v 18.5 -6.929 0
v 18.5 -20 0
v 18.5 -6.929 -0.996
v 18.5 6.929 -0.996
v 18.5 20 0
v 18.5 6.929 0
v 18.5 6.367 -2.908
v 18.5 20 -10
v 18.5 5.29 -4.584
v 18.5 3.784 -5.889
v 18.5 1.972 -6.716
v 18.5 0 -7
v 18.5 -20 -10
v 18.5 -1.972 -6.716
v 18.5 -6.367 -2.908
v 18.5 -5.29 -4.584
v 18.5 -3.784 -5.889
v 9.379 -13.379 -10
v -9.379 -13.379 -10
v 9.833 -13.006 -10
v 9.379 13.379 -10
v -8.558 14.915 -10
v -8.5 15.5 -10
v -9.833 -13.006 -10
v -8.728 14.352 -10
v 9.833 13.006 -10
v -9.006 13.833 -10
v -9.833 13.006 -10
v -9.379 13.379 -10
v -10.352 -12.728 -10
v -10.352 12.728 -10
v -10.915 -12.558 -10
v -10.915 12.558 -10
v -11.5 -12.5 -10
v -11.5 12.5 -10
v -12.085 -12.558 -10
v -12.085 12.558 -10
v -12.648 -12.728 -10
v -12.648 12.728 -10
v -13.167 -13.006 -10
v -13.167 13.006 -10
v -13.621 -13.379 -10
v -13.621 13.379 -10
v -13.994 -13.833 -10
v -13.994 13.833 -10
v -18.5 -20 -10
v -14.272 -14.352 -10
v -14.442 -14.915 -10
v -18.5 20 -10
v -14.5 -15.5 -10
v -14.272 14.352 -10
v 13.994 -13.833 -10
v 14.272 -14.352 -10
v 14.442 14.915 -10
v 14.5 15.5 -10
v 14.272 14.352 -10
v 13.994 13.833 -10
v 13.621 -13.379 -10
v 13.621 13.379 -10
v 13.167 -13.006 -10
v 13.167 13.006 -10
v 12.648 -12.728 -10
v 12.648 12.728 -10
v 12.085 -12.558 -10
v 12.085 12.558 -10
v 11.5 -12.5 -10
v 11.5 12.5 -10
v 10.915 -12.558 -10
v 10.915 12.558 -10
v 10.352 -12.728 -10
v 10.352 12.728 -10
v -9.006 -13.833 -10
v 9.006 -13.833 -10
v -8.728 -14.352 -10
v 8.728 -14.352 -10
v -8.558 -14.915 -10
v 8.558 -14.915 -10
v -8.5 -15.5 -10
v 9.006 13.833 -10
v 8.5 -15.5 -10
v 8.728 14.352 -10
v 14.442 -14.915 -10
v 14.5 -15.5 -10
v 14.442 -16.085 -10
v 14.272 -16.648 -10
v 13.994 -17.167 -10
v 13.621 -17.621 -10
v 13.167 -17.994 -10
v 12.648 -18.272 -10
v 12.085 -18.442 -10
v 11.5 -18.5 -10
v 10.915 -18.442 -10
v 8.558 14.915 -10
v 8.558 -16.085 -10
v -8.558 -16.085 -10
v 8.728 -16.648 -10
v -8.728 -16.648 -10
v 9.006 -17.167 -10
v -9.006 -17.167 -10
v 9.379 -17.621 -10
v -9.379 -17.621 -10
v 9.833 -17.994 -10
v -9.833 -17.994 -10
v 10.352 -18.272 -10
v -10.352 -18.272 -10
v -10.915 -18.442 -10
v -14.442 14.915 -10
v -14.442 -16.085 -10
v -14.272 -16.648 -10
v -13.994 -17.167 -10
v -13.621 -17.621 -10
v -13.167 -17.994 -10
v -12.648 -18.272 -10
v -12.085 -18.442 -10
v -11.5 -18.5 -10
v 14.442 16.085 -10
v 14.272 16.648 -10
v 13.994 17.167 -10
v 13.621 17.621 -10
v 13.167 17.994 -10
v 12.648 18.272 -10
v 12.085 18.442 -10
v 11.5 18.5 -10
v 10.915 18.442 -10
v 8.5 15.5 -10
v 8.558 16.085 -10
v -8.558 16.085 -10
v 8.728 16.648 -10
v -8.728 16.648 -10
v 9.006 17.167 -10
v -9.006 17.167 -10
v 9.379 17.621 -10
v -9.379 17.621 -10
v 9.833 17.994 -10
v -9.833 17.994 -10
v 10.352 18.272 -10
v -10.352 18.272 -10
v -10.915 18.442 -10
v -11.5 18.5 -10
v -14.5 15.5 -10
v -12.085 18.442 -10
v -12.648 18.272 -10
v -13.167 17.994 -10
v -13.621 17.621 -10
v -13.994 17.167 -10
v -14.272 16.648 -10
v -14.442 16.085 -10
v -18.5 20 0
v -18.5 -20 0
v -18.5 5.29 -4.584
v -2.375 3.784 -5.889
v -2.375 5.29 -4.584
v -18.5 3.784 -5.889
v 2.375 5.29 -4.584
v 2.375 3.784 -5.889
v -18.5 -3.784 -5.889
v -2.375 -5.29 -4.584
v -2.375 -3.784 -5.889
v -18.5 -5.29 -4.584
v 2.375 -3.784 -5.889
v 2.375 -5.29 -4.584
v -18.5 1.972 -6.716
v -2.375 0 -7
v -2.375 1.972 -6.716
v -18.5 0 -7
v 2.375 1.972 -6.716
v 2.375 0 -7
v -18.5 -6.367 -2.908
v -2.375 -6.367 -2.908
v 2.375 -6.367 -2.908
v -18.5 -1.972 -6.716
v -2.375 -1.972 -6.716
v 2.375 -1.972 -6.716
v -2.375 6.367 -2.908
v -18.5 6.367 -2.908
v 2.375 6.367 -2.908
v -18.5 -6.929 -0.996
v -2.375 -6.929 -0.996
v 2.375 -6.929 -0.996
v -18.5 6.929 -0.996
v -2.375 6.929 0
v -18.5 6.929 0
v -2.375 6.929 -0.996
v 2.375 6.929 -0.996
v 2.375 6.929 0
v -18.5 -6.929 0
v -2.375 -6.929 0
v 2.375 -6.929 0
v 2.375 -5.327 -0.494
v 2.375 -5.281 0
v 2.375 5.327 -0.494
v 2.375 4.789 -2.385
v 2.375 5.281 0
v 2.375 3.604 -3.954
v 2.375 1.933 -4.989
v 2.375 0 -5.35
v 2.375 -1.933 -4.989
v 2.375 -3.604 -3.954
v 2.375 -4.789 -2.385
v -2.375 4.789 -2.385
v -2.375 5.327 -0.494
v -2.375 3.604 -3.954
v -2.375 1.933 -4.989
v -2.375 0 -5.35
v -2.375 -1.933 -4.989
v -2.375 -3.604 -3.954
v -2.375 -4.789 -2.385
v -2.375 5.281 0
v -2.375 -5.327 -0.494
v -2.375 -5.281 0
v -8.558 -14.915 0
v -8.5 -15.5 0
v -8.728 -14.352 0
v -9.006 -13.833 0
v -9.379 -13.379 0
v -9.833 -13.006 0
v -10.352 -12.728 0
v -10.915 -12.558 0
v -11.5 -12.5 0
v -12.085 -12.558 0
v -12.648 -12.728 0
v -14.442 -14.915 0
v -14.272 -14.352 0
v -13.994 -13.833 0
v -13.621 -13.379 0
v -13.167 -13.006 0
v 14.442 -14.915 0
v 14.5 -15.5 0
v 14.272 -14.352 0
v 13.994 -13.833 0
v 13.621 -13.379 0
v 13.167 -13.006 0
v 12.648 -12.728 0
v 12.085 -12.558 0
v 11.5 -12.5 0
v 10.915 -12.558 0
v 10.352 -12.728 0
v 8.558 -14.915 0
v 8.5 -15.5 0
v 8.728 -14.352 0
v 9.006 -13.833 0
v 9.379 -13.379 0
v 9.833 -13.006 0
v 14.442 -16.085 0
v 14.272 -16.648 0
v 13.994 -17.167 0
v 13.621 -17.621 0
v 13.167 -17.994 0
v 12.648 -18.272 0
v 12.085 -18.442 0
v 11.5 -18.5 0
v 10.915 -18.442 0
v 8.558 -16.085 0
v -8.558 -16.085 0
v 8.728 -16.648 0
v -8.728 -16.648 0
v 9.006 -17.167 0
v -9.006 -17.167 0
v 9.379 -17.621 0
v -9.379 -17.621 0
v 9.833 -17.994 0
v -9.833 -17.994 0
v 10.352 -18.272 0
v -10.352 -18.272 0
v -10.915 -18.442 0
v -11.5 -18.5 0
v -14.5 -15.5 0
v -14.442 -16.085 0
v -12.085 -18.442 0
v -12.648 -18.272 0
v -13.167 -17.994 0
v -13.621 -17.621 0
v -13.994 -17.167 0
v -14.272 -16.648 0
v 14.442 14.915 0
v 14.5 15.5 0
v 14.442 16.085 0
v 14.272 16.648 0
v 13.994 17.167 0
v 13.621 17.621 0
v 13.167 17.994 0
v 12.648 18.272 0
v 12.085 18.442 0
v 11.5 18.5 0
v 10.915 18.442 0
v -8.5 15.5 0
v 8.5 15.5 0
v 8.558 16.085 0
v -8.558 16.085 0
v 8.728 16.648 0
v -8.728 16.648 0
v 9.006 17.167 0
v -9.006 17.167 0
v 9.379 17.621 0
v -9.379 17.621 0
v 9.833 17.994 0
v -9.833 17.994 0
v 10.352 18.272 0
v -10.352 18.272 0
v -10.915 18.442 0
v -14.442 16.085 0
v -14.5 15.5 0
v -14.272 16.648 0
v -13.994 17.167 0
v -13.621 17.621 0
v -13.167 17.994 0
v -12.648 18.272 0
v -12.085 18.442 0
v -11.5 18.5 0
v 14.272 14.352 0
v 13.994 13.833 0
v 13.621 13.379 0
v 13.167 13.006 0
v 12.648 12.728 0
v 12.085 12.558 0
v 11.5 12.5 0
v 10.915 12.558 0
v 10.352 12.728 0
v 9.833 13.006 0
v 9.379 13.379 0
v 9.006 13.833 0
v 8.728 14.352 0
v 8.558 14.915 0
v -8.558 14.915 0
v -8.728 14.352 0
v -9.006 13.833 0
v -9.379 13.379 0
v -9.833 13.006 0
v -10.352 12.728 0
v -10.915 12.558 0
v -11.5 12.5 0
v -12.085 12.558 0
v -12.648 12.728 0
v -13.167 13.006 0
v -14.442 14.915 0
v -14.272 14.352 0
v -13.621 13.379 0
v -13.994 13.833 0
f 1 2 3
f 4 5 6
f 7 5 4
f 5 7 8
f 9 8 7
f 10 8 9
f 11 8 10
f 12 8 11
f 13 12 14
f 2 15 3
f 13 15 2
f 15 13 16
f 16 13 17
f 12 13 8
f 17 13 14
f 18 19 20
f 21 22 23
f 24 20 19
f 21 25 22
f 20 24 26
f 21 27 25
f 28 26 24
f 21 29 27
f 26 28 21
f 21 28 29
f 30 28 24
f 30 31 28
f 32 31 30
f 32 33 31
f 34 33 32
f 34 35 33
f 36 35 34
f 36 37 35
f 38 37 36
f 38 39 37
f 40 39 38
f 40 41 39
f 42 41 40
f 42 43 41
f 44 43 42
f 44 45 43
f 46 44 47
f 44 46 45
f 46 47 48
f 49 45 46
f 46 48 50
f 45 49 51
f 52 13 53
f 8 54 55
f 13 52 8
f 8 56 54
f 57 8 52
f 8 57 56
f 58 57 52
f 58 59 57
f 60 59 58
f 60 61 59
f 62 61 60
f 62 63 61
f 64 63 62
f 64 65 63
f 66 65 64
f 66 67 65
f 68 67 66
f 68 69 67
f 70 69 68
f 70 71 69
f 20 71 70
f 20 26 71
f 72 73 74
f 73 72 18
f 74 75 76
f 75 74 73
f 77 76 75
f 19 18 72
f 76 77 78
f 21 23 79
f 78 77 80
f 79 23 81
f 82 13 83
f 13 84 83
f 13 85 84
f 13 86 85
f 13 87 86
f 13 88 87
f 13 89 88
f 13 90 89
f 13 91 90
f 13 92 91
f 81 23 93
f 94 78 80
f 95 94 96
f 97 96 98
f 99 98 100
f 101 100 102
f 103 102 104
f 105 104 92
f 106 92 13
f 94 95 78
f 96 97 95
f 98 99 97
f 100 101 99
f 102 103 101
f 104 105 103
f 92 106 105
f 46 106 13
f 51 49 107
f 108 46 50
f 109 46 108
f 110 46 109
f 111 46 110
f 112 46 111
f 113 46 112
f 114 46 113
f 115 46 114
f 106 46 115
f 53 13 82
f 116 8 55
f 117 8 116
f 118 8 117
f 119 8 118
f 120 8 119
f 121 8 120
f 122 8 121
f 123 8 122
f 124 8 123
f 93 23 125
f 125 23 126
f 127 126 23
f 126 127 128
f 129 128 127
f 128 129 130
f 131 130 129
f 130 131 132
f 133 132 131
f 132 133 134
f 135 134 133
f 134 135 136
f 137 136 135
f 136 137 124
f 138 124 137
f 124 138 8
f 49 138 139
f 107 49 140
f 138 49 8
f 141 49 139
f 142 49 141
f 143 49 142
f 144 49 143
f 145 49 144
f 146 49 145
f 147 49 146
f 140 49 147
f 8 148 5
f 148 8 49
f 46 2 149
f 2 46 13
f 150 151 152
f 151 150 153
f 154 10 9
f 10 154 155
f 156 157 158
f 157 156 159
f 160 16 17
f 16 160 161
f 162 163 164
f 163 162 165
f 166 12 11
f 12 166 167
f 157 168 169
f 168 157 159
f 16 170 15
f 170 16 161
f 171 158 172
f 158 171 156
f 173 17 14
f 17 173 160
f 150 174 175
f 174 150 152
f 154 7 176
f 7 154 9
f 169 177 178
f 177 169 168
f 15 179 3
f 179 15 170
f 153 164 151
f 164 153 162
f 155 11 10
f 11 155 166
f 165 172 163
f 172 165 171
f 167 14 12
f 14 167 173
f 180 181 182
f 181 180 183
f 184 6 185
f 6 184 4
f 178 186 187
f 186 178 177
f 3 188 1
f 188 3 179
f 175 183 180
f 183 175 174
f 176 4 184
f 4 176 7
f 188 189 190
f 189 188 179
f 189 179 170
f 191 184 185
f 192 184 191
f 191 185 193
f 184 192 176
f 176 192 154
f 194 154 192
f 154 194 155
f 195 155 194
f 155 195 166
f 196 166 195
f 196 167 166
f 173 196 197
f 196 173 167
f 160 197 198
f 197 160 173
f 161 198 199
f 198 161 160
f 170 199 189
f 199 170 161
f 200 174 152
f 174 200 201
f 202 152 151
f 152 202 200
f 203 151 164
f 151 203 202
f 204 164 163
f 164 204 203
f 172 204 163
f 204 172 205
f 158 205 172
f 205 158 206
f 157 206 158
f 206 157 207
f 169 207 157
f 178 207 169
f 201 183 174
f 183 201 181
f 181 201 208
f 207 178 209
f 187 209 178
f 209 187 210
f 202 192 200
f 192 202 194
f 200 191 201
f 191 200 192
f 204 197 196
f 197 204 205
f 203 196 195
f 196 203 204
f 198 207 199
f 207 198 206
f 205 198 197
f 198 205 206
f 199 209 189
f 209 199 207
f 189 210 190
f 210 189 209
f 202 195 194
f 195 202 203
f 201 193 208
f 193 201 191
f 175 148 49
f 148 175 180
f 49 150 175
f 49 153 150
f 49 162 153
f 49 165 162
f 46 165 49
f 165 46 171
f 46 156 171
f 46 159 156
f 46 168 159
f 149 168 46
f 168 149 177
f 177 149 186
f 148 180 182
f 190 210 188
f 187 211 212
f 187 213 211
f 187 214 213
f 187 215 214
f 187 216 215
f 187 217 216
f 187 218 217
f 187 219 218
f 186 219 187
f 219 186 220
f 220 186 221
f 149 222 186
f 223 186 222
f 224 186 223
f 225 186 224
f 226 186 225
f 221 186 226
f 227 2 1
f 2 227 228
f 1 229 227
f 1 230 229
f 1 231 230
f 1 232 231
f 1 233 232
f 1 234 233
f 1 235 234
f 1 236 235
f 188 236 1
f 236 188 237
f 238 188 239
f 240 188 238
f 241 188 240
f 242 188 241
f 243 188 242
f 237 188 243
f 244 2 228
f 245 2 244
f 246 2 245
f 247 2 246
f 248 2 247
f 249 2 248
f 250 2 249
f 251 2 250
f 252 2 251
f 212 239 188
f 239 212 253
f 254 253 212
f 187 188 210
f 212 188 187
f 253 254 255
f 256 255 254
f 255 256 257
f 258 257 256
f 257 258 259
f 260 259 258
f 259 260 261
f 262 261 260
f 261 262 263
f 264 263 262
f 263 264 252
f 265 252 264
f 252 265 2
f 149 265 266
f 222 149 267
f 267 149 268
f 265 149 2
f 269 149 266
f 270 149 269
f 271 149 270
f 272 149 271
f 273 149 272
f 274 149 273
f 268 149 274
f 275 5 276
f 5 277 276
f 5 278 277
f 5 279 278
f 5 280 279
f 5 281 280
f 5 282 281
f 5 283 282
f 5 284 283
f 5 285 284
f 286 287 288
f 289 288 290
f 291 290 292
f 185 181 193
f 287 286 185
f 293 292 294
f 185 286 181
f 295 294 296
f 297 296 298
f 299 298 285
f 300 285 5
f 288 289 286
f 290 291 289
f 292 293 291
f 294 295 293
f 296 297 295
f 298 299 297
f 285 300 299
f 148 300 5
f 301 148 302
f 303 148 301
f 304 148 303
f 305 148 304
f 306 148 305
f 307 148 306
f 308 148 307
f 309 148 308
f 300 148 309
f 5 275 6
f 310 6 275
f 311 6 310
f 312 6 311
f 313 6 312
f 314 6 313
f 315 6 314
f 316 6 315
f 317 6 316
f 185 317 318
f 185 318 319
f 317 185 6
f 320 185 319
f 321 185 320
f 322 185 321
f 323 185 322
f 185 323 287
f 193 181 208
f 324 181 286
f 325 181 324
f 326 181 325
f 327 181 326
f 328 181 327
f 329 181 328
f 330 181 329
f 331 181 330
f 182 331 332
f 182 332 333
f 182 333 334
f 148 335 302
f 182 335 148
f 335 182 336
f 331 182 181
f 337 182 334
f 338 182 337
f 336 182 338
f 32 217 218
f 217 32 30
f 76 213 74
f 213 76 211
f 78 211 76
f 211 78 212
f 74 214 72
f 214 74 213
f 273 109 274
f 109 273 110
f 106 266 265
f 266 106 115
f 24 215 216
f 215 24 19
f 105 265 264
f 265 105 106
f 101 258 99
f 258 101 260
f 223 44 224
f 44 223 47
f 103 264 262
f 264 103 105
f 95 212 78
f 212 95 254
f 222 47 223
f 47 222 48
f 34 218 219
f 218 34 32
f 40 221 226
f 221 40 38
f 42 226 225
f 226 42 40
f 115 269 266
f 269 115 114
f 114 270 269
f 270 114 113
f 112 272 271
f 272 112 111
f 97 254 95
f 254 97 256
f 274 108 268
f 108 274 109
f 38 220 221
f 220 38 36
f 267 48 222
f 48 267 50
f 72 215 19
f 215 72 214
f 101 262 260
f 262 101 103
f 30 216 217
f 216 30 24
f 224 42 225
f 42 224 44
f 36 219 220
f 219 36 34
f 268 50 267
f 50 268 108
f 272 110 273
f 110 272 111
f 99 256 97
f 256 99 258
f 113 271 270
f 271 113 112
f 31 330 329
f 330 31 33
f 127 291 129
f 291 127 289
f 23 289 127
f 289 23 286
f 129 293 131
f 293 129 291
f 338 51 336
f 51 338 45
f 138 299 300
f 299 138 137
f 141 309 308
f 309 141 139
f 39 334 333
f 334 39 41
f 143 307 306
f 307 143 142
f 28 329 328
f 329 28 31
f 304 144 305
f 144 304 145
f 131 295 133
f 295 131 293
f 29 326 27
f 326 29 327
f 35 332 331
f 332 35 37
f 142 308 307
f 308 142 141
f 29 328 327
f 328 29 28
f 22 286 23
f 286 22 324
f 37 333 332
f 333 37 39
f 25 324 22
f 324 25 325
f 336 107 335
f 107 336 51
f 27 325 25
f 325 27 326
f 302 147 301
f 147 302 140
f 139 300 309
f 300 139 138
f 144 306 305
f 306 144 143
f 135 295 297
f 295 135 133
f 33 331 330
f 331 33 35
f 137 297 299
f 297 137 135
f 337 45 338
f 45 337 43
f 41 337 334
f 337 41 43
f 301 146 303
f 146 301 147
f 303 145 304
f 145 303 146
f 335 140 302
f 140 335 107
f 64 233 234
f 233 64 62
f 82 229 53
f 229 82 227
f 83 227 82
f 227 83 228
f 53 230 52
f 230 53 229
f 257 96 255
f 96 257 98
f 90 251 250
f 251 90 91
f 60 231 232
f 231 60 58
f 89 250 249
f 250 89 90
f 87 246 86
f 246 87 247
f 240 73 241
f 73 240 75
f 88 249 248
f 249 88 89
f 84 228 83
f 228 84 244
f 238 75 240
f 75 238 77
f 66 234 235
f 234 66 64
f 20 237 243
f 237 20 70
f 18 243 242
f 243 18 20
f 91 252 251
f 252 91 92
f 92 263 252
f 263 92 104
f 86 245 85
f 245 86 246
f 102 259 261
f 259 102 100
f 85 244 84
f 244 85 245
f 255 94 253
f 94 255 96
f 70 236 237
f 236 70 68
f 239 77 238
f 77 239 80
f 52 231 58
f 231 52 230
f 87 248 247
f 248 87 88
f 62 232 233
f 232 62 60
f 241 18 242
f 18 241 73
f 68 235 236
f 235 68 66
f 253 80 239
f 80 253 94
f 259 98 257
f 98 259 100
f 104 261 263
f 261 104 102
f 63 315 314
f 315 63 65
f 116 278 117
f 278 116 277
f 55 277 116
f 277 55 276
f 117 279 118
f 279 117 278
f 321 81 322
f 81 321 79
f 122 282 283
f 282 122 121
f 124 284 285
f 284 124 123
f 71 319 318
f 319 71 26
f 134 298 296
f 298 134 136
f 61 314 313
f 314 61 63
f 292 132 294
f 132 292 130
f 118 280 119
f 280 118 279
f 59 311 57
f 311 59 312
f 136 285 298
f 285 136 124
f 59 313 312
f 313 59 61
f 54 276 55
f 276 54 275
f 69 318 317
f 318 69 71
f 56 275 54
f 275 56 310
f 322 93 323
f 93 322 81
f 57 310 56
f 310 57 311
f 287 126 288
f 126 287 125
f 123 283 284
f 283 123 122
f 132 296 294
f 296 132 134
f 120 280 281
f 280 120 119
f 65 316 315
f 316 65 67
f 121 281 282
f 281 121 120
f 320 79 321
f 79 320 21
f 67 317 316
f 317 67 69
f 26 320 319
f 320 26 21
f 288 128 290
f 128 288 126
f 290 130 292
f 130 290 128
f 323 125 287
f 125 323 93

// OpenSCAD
translate() {
	union() {
		translate(v = [0, 0, 0]) {
			difference() {
				difference() {
					difference() {
						union() {
							translate(v = [4.8750000000, 0, 0]) {
								difference() {
									cube(center = true, size = [27.2500000000, 40, 20]);
									rotate(a = 90, v = [0, 1, 0]) {
										cylinder(h = 54.5000000000, r = 7.0000000000, center = true);
									}
								}
							}
							translate(v = [0, 0, 0]) {
								difference() {
									cube(center = true, size = [4.7500000000, 40, 20]);
									rotate(a = 90, v = [0, 1, 0]) {
										cylinder(h = 9.5000000000, r = 5.3500000000, center = true);
									}
								}
							}
							translate(v = [-4.8750000000, 0, 0]) {
								difference() {
									cube(center = true, size = [27.2500000000, 40, 20]);
									rotate(a = 90, v = [0, 1, 0]) {
										cylinder(h = 54.5000000000, r = 7.0000000000, center = true);
									}
								}
							}
						}
						translate(v = [0, 0, 10.0000000000]) {
							cube(center = true, size = [147.5000000000, 40, 20]);
						}
					}
				}
				union() {
					translate(v = [-11.5000000000, 0, 0]) {
						translate(v = [0, -15.5000000000, 0]) {
							cylinder($fn = 32, h = 100, r = 3.0000000000, center = true);
						}
						translate(v = [0, 15.5000000000, 0]) {
							cylinder($fn = 32, h = 100, r = 3.0000000000, center = true);
						}
					}
					translate(v = [11.5000000000, 0, 0]) {
						translate(v = [0, -15.5000000000, 0]) {
							cylinder($fn = 32, h = 100, r = 3.0000000000, center = true);
						}
						translate(v = [0, 15.5000000000, 0]) {
							cylinder($fn = 32, h = 100, r = 3.0000000000, center = true);
						}
					}
				}
			}
		}
	}
}
/***********************************************
******      SolidPython code:      *************
************************************************
 
# -*- coding: utf-8 -*-

from core import *


class Support( Element ):

    def create_inner( self ):

        length = self.s.x - ( self.p.get('core_length') )
        radius = self.p.get('inner_radius')

        return difference() (
            cube( [ length, self.s.y, self.s.z ], center=True ),
            rotate(90, [0,1,0]) (
                cylinder(
                    h=length *2,
                    r=radius,
                    center=True
                )
            )
        )

    def create_core( self ):
        length = self.p.get('core_length')
        radius = self.p.get('core_radius')

        return difference() (
            cube( [ length, self.s.y, self.s.z ], center=True ),
            rotate(90, [0,1,0]) (
                cylinder(
                    h=length *2,
                    r=radius,
                    center=True
                )
            )
        )

    def create_outer( self ):
        length = self.s.x - ( self.p.get('core_length') )
        radius = self.p.get('outer_radius')

        return difference() (
            cube( [ length, self.s.y, self.s.z ], center=True ),
            rotate(90, [0,1,0]) (
                cylinder(
                    h=length *2,
                    r=radius,
                    center=True
                )
            )
        )

    def create_bolt_hole( self ):
        return cylinder(
            self.p.get('bolt_hole_radius'),
            100,
            center=True,
            segments=self.p.get("segments")
        )

    def create_bolt_holes( self ):



        x_offset_from_center = self.s.half('x') - \
                             (self.p.get('bolt_hole_radius') + \
                              self.p.get('bolt_hole_outer_offset'))

        y_offset_from_center = self.s.half('y') - \
                             (self.p.get('bolt_hole_radius') + \
                              self.p.get('bolt_hole_outer_offset'))

        return union() (
            left( x_offset_from_center ) (
                back( y_offset_from_center ) ( self.create_bolt_hole() ),
                forward( y_offset_from_center ) ( self.create_bolt_hole() )
            ),
            right( x_offset_from_center ) (
                back( y_offset_from_center ) ( self.create_bolt_hole() ),
                forward( y_offset_from_center ) ( self.create_bolt_hole() )
            ),
        )

    def create_first_layer( self ):

        total_length = sum([
            self.p.get('inner_length'),
            self.p.get('core_length'),
            self.p.get('outer_length'),
        ])

        half_core_length = self.p.get('core_length') / 2.0

        return difference() (
            difference() (
                union() (
                    translate(
                        [self.p.get('inner_length') / 2.0 + half_core_length , 0, 0]
                    ) ( self.create_inner() ),
                    translate([0,0,0]) ( self.create_core() ),
                    translate(
                        [-(self.p.get('outer_length') / 2.0 + half_core_length), 0, 0]
                    ) ( self.create_outer() )
                ),
                translate([ 0, 0, self.s.half('z') ]) (
                    cube([total_length * 10.0, self.s.y, self.s.z], center=True )
                )
            )
        )

    def apply_bolt_holes( self, target ):
        return difference() (
            target,
            self.create_bolt_holes()
        )

    def create_second_layer( self ):
        return mirror([1, 0, 0]) (
            self.create_first_layer()
        )

    def create( self ):

        spacing = 30

        # position with a equidistant point-cloud

        return union() (
            translate( [0, 0, 0] ) (
                self.apply_bolt_holes( self.create_first_layer() )
            ),

            # translate( [ self.s.x + spacing, 0, 0] ) (
            #    self.apply_bolt_holes( self.create_second_layer() )
            # ),


            # translate( [0, self.s.y + spacing, 0] ) (
            #
            #     translate( [ 0, 0, 0 ] ) (
            #         self.apply_bolt_holes(
            #             rotate( 90, [0,0,1] ) (
            #                 self.create_first_layer()
            #             )
            #         )
            #     ),
            #
            #     translate( [ self.s.x + spacing, 0, 0 ] ) (
            #         self.apply_bolt_holes(
            #             rotate( 90, [0,0,1] ) (
            #                 self.create_second_layer()
            #             )
            #         )
            #     )
            # )
            #
        )






if __name__ == "__main__":


    e = Support(
        Size( 32, 40, 20 ),
        parameters={
            'segments': 32,
            'outer_length': 5.0 ,
            'outer_radius': 7.0,
            'core_length': 4.75,
            'core_radius': 5.35,
            'inner_length': 5.0,
            'inner_radius': 7.0,
            'bolt_hole_radius': 3.0,
            'bolt_hole_outer_offset': 1.5
        }
    )
    e.create()

    scad_render_to_file( e.put(), "project.scad" ) 
 
***********************************************/
                            
